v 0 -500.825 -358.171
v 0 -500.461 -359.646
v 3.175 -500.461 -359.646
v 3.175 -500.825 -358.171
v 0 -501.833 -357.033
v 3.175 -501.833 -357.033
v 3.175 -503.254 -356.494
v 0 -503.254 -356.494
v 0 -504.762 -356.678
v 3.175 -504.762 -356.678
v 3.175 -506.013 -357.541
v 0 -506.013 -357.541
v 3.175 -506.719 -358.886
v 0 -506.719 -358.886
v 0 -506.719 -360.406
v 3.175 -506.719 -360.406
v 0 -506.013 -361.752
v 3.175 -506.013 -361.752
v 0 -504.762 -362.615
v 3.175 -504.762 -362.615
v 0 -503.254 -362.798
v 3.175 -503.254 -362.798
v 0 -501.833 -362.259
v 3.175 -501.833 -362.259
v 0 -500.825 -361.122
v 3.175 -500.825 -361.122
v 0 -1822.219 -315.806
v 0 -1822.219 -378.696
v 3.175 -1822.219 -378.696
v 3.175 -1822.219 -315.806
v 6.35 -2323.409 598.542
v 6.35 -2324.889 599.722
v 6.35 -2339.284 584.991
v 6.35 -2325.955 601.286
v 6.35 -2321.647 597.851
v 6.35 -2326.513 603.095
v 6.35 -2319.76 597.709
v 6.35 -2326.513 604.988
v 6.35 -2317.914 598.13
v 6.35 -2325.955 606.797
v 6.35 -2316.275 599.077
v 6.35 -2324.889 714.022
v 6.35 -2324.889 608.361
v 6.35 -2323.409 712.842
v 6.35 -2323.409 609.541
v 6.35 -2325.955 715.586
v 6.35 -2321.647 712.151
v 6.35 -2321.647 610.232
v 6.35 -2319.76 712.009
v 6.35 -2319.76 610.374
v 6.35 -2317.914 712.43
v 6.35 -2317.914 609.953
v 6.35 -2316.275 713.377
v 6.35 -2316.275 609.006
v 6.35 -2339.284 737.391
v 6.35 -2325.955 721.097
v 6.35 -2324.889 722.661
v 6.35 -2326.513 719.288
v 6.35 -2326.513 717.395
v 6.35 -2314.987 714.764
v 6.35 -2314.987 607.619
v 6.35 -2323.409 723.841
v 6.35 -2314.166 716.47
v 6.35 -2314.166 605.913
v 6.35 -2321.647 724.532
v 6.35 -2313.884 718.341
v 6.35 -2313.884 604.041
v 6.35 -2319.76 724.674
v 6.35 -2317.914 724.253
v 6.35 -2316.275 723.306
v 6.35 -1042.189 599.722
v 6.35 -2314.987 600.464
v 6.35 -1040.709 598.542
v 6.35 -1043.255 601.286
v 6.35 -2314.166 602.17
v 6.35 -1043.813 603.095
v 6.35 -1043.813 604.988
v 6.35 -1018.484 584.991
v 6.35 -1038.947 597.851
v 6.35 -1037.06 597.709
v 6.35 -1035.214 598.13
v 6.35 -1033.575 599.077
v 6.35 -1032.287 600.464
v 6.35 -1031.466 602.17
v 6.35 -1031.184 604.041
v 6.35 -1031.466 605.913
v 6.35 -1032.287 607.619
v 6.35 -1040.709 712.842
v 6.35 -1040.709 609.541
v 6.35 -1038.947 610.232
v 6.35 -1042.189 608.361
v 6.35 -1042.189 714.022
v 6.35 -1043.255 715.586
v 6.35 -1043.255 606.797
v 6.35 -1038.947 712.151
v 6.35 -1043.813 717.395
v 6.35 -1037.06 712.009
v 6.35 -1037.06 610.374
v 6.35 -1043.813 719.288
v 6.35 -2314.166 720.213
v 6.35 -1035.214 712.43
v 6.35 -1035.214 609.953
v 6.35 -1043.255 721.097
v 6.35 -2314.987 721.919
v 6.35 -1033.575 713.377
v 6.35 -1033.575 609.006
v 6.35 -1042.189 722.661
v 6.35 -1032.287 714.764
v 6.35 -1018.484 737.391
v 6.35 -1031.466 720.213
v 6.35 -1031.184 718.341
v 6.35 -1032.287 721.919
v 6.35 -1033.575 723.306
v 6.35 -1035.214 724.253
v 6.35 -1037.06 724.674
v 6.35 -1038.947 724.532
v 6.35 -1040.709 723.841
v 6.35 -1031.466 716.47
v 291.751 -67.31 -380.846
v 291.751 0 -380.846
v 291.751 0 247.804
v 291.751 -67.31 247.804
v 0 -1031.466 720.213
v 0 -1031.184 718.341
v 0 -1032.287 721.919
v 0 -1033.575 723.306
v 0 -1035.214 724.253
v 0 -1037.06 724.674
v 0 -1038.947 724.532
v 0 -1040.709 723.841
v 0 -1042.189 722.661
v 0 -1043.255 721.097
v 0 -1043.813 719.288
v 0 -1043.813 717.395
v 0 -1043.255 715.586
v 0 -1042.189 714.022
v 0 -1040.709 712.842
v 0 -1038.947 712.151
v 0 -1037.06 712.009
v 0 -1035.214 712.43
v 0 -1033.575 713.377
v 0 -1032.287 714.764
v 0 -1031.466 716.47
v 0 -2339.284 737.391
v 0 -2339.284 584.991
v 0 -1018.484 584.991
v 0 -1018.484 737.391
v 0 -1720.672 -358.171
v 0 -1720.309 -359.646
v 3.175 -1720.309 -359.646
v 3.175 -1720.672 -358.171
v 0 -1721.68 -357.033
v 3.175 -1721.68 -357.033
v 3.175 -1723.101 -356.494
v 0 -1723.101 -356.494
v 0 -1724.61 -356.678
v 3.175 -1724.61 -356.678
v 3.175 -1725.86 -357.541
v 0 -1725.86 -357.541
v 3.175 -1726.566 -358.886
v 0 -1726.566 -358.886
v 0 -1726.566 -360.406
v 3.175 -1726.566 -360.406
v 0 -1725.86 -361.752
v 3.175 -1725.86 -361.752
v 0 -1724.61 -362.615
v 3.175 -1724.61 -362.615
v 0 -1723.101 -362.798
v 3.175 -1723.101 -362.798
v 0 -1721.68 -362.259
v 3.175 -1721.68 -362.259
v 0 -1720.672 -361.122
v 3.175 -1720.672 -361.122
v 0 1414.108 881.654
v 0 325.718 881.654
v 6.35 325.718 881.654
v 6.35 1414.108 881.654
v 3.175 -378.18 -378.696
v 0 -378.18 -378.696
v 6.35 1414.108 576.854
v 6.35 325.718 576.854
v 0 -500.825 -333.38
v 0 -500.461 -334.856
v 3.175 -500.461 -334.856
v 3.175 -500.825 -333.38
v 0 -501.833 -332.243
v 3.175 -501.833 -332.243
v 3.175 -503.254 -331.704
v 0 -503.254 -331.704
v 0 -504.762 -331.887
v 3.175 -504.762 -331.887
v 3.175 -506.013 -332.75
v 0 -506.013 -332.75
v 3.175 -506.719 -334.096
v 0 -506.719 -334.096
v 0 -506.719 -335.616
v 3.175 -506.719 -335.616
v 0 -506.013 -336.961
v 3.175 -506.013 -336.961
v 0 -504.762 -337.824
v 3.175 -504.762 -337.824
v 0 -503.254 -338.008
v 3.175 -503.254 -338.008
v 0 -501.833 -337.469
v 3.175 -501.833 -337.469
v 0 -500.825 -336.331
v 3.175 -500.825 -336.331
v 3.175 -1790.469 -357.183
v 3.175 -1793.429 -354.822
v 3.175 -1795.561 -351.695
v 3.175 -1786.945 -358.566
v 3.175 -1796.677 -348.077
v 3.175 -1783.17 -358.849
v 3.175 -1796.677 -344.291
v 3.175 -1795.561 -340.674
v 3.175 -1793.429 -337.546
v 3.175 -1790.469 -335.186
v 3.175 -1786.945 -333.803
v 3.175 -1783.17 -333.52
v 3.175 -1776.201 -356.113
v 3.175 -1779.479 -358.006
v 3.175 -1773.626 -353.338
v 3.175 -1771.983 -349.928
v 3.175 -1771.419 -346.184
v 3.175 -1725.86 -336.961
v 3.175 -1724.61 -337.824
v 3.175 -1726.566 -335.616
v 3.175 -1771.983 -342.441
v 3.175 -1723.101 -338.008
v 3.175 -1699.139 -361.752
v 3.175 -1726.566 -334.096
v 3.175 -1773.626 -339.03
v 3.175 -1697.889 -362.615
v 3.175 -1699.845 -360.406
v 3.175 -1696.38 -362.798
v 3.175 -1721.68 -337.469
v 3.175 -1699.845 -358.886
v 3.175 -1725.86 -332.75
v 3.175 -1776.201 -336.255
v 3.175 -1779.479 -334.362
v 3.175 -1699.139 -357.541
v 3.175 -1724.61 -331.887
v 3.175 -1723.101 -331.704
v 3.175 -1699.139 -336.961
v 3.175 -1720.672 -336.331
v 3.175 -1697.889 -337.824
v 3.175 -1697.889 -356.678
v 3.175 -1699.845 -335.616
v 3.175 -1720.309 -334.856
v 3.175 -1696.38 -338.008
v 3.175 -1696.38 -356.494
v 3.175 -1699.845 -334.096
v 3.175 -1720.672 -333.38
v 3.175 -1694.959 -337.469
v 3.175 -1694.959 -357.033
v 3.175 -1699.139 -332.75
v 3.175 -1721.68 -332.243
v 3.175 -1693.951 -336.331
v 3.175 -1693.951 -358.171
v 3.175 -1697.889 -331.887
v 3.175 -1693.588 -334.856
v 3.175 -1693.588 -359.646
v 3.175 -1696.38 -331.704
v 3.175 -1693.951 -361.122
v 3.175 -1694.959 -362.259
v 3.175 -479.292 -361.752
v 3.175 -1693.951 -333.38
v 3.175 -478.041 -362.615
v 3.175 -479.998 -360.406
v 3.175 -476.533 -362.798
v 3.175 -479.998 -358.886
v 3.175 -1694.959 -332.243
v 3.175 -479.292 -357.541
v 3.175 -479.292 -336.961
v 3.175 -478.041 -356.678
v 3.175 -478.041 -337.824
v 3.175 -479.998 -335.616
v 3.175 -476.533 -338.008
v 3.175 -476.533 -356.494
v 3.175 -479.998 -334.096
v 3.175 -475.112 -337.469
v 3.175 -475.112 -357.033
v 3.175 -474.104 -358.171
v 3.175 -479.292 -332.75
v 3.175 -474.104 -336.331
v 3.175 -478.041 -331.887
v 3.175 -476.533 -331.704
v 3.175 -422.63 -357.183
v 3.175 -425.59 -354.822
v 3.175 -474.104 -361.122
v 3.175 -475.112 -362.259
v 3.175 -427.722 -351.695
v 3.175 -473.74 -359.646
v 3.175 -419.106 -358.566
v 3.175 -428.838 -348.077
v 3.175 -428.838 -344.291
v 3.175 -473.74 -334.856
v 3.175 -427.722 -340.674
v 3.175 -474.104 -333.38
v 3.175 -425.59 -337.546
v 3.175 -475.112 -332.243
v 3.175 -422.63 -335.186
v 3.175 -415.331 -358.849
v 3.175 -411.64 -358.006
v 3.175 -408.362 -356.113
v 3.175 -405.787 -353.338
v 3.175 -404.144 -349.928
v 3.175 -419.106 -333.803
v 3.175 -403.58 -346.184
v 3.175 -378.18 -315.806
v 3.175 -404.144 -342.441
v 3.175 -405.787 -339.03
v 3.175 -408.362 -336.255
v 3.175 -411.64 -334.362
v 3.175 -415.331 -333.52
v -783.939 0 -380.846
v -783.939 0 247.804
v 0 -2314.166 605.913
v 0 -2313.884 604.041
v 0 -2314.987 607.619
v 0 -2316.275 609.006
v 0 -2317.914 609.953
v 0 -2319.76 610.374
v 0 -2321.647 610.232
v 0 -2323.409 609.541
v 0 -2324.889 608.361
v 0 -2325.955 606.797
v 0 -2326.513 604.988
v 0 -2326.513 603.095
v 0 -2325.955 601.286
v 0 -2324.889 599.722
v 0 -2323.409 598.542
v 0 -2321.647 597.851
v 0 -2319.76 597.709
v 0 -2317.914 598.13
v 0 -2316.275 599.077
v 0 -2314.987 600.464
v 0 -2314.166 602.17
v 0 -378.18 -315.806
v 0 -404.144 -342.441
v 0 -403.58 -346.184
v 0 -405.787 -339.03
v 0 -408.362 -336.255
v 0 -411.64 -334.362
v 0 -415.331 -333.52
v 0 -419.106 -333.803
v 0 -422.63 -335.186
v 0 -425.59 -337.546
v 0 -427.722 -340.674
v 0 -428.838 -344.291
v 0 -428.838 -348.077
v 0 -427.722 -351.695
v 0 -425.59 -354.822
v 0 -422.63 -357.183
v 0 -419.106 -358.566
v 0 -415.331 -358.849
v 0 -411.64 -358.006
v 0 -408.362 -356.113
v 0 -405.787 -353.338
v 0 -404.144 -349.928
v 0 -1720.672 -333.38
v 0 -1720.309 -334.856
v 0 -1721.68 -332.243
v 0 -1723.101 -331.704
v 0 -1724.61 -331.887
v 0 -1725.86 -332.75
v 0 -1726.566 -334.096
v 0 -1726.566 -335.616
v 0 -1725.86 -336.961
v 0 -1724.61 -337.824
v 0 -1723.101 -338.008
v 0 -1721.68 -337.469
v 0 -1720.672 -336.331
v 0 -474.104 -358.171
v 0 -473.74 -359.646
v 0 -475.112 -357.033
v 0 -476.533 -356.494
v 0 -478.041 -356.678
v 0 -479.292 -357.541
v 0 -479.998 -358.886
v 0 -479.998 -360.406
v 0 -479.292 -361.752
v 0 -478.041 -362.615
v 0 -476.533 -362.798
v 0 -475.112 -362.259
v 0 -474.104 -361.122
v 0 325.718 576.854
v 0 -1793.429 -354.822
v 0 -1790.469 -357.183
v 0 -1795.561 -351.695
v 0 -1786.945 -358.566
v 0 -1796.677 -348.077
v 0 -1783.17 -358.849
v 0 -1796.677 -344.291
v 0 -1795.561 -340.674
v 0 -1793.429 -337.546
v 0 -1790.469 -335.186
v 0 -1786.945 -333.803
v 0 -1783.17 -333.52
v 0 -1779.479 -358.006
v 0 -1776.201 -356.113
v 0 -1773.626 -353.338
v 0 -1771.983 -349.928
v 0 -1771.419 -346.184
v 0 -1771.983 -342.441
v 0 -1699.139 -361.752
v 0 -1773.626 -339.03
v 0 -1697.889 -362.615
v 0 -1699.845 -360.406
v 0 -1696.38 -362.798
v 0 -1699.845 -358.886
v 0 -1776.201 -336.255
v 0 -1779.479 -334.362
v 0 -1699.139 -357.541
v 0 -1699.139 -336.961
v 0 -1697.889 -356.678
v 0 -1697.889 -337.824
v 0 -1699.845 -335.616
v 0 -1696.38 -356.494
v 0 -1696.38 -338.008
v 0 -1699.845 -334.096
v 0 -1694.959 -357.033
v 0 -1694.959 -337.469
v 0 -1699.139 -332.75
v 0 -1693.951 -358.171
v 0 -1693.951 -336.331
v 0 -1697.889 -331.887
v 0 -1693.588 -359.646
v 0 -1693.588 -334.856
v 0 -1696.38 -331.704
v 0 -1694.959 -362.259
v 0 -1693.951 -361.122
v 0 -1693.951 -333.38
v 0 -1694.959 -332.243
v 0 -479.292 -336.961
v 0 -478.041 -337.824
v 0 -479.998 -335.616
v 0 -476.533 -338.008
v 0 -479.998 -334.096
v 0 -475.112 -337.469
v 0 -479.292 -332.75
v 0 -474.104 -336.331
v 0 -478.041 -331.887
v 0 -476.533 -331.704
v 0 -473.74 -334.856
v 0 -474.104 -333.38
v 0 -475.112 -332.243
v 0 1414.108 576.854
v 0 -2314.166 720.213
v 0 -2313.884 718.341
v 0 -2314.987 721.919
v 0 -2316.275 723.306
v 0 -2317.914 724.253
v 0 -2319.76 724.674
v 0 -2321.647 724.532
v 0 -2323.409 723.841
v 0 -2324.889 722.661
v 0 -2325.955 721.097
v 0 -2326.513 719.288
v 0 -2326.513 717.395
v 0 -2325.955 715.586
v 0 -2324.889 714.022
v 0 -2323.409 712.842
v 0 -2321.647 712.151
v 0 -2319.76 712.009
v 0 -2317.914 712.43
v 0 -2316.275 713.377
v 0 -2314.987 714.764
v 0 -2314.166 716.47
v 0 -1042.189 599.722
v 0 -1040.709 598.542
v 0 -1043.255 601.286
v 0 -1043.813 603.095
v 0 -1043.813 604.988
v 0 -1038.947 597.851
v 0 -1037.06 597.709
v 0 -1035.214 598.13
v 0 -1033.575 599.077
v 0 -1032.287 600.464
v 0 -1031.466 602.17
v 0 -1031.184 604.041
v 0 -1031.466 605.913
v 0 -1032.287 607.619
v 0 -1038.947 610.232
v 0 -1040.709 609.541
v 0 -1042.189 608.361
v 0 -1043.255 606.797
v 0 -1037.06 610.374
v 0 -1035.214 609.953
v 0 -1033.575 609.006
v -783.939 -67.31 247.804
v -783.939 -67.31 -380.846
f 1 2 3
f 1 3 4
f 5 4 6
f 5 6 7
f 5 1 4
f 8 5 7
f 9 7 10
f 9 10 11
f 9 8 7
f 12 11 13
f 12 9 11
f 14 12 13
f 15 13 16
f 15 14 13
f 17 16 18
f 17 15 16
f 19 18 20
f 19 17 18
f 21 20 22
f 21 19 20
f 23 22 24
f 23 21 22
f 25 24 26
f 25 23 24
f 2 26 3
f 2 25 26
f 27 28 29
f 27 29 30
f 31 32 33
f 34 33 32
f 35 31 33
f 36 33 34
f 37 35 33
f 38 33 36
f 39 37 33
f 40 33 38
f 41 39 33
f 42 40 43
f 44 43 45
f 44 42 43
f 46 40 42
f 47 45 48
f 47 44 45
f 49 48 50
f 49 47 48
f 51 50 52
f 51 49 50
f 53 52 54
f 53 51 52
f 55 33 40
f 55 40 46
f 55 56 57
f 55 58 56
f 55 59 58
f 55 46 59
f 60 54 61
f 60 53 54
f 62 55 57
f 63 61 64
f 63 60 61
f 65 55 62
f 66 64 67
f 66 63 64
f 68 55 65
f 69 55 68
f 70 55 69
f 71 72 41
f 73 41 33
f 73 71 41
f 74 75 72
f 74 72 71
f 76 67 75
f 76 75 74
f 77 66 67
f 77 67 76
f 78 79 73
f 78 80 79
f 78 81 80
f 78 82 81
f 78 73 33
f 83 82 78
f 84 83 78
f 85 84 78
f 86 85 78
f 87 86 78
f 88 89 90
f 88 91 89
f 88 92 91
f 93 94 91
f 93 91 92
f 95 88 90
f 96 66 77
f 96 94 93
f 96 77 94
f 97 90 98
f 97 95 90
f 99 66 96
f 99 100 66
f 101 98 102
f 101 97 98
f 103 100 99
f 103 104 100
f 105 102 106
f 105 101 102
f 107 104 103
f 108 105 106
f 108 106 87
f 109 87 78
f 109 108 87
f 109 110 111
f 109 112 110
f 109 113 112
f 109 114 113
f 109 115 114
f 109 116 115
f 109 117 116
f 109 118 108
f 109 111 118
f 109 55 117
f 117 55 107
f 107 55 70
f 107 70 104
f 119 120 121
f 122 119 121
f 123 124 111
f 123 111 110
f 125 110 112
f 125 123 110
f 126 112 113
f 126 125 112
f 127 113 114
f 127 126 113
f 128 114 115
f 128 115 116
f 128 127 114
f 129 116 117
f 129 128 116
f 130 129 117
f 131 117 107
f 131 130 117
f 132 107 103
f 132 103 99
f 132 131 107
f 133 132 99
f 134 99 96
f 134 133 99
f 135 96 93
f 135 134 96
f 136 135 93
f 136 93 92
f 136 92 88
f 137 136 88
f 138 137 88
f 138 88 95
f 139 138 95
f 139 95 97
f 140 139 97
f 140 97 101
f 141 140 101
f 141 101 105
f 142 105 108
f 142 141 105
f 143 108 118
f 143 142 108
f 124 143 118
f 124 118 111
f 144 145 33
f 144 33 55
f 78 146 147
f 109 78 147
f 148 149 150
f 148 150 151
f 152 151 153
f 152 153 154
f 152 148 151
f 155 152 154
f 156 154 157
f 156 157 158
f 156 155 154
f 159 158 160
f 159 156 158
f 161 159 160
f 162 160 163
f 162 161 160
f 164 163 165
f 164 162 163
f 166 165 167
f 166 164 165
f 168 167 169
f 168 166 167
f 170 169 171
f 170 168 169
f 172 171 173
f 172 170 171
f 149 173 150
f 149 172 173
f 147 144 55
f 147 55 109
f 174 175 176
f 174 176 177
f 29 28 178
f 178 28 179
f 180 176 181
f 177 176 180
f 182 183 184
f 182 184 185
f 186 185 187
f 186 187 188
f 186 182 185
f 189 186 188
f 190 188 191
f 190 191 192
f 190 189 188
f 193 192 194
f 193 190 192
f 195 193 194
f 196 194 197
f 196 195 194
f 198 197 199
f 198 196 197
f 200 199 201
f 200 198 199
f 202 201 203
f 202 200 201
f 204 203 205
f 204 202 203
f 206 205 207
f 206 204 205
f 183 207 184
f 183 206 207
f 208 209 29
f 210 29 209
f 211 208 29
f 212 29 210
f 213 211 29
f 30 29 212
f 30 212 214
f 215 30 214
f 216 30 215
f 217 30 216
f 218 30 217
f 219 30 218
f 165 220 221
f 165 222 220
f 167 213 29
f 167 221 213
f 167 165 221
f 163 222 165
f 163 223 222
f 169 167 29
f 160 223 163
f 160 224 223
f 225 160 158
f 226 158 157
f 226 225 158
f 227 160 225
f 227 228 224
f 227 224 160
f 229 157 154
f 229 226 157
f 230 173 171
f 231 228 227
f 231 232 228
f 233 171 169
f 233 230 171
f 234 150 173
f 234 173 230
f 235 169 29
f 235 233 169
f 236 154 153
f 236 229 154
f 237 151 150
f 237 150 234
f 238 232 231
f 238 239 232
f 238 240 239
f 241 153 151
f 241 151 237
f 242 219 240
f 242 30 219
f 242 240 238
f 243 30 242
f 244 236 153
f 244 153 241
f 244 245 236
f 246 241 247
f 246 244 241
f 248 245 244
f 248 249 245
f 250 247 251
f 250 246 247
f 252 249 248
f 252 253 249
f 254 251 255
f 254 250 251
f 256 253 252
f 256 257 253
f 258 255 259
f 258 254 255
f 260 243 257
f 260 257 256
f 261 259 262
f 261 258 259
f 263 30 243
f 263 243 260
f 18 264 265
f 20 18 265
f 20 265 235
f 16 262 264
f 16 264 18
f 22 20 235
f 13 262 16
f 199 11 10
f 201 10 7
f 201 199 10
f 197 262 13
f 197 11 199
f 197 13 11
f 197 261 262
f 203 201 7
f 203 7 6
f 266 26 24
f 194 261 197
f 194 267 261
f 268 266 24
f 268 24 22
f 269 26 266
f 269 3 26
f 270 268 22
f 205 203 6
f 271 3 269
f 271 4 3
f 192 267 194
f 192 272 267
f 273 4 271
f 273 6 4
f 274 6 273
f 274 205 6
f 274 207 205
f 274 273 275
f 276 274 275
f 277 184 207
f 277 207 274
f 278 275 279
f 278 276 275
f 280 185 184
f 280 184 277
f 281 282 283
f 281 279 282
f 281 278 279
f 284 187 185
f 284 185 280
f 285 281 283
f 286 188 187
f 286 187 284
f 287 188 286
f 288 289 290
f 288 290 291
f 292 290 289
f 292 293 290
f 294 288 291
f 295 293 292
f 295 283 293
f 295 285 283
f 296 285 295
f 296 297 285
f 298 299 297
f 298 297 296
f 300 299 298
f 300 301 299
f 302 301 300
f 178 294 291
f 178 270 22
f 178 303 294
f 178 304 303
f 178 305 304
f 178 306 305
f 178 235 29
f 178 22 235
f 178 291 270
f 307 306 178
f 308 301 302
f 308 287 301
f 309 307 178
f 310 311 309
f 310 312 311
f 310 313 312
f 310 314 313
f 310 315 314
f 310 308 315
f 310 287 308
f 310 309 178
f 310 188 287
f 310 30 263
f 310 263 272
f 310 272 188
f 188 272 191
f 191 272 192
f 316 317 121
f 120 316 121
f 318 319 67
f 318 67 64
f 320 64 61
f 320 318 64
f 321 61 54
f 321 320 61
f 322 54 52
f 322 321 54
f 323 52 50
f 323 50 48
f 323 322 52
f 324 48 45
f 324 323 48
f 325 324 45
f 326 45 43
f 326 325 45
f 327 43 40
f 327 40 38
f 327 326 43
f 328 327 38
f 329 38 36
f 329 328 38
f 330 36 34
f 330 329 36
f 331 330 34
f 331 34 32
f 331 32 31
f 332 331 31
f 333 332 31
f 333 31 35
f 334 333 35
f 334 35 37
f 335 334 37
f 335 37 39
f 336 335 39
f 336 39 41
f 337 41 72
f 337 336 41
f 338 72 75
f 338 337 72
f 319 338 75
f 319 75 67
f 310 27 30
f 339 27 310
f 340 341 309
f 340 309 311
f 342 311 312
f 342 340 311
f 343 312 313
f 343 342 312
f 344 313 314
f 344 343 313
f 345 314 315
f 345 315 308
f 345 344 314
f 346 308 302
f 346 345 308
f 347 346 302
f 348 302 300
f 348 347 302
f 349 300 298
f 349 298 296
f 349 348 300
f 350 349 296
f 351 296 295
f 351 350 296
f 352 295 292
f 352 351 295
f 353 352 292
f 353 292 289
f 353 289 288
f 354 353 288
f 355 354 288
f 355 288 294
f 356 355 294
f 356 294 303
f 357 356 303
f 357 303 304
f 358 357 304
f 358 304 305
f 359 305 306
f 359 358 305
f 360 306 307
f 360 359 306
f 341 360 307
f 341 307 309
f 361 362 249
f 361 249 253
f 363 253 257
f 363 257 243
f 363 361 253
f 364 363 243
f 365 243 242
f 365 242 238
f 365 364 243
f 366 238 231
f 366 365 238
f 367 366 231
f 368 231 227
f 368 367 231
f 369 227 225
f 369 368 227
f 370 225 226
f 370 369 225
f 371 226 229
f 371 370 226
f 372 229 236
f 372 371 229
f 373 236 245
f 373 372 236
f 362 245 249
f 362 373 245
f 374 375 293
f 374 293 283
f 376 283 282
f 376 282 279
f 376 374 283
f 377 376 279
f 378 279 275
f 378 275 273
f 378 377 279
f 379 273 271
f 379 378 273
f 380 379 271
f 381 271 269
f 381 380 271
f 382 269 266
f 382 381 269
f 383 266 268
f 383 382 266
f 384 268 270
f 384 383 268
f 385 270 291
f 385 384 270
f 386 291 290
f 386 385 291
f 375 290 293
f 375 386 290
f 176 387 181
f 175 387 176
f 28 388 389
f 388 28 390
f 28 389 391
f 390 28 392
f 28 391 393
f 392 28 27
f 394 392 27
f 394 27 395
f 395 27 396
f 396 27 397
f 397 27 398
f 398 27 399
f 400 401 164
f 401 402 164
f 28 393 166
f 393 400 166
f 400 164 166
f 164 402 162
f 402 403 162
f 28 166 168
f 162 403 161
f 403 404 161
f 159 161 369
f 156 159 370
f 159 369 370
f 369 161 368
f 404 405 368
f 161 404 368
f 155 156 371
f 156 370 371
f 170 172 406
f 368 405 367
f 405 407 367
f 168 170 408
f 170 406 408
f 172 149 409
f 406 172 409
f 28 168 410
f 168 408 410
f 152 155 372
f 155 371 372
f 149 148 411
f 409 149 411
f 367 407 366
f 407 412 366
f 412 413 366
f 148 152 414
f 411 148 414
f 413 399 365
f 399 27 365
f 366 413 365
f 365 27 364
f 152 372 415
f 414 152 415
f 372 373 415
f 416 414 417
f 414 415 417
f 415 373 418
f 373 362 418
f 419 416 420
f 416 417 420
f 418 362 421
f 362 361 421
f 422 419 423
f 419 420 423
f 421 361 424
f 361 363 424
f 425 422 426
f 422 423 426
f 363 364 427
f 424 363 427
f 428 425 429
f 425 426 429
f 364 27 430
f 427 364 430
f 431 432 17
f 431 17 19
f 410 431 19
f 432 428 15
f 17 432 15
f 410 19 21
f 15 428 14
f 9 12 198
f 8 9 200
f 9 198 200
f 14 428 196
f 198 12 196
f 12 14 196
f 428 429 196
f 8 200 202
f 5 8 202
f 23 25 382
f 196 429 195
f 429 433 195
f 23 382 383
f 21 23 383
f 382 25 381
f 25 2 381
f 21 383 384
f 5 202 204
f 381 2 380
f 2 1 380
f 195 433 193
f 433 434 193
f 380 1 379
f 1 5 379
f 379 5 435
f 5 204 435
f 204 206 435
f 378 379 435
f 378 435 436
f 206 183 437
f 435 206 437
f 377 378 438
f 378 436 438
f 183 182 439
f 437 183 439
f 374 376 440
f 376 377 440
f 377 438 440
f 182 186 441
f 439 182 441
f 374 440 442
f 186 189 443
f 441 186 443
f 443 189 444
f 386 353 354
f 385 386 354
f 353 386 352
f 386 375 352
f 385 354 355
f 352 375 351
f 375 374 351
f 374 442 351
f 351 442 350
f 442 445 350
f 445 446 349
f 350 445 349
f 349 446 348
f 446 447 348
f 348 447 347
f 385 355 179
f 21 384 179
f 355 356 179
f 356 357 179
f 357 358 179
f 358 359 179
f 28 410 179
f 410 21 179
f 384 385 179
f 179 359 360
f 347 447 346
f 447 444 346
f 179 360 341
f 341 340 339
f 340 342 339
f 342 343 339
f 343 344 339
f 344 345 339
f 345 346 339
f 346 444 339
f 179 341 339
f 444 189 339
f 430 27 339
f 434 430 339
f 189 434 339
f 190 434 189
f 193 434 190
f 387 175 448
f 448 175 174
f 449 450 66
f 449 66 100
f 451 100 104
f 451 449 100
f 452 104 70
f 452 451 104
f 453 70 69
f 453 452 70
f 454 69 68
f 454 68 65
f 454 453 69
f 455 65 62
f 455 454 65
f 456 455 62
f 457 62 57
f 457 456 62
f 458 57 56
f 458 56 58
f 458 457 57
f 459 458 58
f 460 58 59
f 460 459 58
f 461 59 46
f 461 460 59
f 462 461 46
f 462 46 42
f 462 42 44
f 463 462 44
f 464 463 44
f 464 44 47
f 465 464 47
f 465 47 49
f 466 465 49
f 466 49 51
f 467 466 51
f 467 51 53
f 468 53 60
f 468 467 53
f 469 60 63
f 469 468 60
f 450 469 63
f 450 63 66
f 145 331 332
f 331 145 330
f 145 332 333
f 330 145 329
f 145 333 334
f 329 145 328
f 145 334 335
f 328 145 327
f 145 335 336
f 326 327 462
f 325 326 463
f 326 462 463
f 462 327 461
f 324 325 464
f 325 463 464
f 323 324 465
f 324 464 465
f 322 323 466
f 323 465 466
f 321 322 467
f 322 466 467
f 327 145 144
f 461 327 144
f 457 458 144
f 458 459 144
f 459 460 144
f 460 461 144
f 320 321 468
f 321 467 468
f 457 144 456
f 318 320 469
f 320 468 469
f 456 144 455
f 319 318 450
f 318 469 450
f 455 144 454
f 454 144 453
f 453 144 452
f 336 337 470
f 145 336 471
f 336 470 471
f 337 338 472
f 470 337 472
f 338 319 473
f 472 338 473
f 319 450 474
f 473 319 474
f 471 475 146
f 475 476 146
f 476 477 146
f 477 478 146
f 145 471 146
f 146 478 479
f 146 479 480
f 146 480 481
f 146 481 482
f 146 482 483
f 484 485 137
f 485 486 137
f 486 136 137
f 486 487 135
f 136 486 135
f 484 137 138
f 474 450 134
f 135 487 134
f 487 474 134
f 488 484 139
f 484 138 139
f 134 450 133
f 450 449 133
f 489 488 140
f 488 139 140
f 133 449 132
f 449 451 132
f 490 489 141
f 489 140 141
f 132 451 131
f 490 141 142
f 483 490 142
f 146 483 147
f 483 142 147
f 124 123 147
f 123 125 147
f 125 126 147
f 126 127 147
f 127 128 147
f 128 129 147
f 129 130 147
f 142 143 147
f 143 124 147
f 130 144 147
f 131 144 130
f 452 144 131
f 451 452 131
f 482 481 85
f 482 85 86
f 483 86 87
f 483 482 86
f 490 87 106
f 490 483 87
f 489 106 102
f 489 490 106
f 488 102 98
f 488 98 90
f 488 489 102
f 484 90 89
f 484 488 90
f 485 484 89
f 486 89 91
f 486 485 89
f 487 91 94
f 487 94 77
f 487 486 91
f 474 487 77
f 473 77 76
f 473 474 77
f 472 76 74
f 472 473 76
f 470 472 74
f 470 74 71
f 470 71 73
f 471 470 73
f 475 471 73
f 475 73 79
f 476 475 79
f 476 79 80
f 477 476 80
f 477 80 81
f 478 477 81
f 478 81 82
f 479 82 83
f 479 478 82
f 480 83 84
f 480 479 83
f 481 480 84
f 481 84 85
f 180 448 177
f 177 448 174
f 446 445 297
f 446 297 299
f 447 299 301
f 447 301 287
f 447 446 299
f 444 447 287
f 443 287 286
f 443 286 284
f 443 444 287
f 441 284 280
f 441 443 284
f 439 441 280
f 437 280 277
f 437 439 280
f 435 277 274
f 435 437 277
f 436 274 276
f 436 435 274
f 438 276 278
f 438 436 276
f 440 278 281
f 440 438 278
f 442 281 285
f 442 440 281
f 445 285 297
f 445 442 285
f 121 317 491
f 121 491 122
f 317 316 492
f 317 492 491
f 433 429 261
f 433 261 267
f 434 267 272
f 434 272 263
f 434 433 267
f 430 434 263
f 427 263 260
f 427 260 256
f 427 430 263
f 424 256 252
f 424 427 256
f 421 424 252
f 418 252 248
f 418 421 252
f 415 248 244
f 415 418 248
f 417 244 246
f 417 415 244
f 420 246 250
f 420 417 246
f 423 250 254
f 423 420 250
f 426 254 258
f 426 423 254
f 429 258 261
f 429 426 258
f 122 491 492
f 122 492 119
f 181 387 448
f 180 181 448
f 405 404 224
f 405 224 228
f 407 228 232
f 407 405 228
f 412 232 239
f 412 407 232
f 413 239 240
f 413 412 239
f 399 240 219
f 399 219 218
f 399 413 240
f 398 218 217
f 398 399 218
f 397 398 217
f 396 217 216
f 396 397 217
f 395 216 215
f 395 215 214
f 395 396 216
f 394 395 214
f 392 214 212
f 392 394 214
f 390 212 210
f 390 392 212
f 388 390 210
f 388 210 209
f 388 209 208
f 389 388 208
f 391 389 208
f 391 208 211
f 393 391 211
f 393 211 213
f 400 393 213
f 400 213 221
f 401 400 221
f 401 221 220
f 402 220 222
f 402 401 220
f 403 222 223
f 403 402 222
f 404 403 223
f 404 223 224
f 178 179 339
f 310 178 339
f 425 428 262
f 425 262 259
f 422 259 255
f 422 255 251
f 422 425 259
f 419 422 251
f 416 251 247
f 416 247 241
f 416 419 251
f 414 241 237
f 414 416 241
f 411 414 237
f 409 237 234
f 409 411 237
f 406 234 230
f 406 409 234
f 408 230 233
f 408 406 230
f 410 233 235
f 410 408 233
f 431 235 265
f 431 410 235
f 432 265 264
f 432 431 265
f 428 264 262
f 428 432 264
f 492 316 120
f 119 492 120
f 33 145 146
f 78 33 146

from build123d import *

# Parameters (mm, degrees)
F0_W     = 1075.69
F0_H     = 628.65
F1_DEPTH = 67.31
F2_W     = 1088.39
F2_H     = 304.8
F3_DEPTH = 6.35
F4_W     = 1320.8
F4_H     = 152.4
F4_R     = 6.35
F5_DEPTH = 6.35
F6_W     = 1444.038768
F6_H     = 62.8904
F6_R     = 3.175
F6_R_2   = 12.7
F7_DEPTH = 3.175


with BuildPart() as f1:
    # F0 (on Front) → F1 (new body)
    with BuildSketch(Plane.XZ):
        with Locations((-246.093969, -66.520754)):
            Rectangle(F0_W, F0_H)
    extrude(amount=F1_DEPTH)


with BuildPart() as f3:
    # F2 (on Right) → F3 (new body)
    with BuildSketch(Plane.YZ):
        with Locations((869.913392, 729.254132)):
            Rectangle(F2_W, F2_H)
    extrude(amount=F3_DEPTH)


with BuildPart() as f5:
    # F4 (on Right) → F5 (new body)
    with BuildSketch(Plane.YZ):
        with Locations((-1678.88408, 661.191472)):
            Rectangle(F4_W, F4_H)
        with Locations((-2320.23408, 604.041472)):
            Circle(F4_R, mode=Mode.SUBTRACT)
        with Locations((-1037.53408, 604.041472)):
            Circle(F4_R, mode=Mode.SUBTRACT)
        with Locations((-2320.23408, 718.341472)):
            Circle(F4_R, mode=Mode.SUBTRACT)
        with Locations((-1037.53408, 718.341472)):
            Circle(F4_R, mode=Mode.SUBTRACT)
    extrude(amount=F5_DEPTH)


with BuildPart() as f7:
    # F6 (on Right) → F7 (new body)
    with BuildSketch(Plane.YZ):
        with Locations((-1100.199498, -347.25102)):
            Rectangle(F6_W, F6_H)
        with Locations((-1723.483647, -359.64622)):
            Circle(F6_R, mode=Mode.SUBTRACT)
        with Locations((-1696.762715, -359.64622)):
            Circle(F6_R, mode=Mode.SUBTRACT)
        with Locations((-503.636282, -359.64622)):
            Circle(F6_R, mode=Mode.SUBTRACT)
        with Locations((-476.915349, -359.64622)):
            Circle(F6_R, mode=Mode.SUBTRACT)
        with Locations((-1784.118882, -346.18422)):
            Circle(F6_R_2, mode=Mode.SUBTRACT)
        with Locations((-1723.483647, -334.85582)):
            Circle(F6_R, mode=Mode.SUBTRACT)
        with Locations((-1696.762715, -334.85582)):
            Circle(F6_R, mode=Mode.SUBTRACT)
        with Locations((-416.280114, -346.18422)):
            Circle(F6_R_2, mode=Mode.SUBTRACT)
        with Locations((-503.636282, -334.85582)):
            Circle(F6_R, mode=Mode.SUBTRACT)
        with Locations((-476.915349, -334.85582)):
            Circle(F6_R, mode=Mode.SUBTRACT)
    extrude(amount=F7_DEPTH)


solid = Compound([f1.part, f3.part, f5.part, f7.part])
